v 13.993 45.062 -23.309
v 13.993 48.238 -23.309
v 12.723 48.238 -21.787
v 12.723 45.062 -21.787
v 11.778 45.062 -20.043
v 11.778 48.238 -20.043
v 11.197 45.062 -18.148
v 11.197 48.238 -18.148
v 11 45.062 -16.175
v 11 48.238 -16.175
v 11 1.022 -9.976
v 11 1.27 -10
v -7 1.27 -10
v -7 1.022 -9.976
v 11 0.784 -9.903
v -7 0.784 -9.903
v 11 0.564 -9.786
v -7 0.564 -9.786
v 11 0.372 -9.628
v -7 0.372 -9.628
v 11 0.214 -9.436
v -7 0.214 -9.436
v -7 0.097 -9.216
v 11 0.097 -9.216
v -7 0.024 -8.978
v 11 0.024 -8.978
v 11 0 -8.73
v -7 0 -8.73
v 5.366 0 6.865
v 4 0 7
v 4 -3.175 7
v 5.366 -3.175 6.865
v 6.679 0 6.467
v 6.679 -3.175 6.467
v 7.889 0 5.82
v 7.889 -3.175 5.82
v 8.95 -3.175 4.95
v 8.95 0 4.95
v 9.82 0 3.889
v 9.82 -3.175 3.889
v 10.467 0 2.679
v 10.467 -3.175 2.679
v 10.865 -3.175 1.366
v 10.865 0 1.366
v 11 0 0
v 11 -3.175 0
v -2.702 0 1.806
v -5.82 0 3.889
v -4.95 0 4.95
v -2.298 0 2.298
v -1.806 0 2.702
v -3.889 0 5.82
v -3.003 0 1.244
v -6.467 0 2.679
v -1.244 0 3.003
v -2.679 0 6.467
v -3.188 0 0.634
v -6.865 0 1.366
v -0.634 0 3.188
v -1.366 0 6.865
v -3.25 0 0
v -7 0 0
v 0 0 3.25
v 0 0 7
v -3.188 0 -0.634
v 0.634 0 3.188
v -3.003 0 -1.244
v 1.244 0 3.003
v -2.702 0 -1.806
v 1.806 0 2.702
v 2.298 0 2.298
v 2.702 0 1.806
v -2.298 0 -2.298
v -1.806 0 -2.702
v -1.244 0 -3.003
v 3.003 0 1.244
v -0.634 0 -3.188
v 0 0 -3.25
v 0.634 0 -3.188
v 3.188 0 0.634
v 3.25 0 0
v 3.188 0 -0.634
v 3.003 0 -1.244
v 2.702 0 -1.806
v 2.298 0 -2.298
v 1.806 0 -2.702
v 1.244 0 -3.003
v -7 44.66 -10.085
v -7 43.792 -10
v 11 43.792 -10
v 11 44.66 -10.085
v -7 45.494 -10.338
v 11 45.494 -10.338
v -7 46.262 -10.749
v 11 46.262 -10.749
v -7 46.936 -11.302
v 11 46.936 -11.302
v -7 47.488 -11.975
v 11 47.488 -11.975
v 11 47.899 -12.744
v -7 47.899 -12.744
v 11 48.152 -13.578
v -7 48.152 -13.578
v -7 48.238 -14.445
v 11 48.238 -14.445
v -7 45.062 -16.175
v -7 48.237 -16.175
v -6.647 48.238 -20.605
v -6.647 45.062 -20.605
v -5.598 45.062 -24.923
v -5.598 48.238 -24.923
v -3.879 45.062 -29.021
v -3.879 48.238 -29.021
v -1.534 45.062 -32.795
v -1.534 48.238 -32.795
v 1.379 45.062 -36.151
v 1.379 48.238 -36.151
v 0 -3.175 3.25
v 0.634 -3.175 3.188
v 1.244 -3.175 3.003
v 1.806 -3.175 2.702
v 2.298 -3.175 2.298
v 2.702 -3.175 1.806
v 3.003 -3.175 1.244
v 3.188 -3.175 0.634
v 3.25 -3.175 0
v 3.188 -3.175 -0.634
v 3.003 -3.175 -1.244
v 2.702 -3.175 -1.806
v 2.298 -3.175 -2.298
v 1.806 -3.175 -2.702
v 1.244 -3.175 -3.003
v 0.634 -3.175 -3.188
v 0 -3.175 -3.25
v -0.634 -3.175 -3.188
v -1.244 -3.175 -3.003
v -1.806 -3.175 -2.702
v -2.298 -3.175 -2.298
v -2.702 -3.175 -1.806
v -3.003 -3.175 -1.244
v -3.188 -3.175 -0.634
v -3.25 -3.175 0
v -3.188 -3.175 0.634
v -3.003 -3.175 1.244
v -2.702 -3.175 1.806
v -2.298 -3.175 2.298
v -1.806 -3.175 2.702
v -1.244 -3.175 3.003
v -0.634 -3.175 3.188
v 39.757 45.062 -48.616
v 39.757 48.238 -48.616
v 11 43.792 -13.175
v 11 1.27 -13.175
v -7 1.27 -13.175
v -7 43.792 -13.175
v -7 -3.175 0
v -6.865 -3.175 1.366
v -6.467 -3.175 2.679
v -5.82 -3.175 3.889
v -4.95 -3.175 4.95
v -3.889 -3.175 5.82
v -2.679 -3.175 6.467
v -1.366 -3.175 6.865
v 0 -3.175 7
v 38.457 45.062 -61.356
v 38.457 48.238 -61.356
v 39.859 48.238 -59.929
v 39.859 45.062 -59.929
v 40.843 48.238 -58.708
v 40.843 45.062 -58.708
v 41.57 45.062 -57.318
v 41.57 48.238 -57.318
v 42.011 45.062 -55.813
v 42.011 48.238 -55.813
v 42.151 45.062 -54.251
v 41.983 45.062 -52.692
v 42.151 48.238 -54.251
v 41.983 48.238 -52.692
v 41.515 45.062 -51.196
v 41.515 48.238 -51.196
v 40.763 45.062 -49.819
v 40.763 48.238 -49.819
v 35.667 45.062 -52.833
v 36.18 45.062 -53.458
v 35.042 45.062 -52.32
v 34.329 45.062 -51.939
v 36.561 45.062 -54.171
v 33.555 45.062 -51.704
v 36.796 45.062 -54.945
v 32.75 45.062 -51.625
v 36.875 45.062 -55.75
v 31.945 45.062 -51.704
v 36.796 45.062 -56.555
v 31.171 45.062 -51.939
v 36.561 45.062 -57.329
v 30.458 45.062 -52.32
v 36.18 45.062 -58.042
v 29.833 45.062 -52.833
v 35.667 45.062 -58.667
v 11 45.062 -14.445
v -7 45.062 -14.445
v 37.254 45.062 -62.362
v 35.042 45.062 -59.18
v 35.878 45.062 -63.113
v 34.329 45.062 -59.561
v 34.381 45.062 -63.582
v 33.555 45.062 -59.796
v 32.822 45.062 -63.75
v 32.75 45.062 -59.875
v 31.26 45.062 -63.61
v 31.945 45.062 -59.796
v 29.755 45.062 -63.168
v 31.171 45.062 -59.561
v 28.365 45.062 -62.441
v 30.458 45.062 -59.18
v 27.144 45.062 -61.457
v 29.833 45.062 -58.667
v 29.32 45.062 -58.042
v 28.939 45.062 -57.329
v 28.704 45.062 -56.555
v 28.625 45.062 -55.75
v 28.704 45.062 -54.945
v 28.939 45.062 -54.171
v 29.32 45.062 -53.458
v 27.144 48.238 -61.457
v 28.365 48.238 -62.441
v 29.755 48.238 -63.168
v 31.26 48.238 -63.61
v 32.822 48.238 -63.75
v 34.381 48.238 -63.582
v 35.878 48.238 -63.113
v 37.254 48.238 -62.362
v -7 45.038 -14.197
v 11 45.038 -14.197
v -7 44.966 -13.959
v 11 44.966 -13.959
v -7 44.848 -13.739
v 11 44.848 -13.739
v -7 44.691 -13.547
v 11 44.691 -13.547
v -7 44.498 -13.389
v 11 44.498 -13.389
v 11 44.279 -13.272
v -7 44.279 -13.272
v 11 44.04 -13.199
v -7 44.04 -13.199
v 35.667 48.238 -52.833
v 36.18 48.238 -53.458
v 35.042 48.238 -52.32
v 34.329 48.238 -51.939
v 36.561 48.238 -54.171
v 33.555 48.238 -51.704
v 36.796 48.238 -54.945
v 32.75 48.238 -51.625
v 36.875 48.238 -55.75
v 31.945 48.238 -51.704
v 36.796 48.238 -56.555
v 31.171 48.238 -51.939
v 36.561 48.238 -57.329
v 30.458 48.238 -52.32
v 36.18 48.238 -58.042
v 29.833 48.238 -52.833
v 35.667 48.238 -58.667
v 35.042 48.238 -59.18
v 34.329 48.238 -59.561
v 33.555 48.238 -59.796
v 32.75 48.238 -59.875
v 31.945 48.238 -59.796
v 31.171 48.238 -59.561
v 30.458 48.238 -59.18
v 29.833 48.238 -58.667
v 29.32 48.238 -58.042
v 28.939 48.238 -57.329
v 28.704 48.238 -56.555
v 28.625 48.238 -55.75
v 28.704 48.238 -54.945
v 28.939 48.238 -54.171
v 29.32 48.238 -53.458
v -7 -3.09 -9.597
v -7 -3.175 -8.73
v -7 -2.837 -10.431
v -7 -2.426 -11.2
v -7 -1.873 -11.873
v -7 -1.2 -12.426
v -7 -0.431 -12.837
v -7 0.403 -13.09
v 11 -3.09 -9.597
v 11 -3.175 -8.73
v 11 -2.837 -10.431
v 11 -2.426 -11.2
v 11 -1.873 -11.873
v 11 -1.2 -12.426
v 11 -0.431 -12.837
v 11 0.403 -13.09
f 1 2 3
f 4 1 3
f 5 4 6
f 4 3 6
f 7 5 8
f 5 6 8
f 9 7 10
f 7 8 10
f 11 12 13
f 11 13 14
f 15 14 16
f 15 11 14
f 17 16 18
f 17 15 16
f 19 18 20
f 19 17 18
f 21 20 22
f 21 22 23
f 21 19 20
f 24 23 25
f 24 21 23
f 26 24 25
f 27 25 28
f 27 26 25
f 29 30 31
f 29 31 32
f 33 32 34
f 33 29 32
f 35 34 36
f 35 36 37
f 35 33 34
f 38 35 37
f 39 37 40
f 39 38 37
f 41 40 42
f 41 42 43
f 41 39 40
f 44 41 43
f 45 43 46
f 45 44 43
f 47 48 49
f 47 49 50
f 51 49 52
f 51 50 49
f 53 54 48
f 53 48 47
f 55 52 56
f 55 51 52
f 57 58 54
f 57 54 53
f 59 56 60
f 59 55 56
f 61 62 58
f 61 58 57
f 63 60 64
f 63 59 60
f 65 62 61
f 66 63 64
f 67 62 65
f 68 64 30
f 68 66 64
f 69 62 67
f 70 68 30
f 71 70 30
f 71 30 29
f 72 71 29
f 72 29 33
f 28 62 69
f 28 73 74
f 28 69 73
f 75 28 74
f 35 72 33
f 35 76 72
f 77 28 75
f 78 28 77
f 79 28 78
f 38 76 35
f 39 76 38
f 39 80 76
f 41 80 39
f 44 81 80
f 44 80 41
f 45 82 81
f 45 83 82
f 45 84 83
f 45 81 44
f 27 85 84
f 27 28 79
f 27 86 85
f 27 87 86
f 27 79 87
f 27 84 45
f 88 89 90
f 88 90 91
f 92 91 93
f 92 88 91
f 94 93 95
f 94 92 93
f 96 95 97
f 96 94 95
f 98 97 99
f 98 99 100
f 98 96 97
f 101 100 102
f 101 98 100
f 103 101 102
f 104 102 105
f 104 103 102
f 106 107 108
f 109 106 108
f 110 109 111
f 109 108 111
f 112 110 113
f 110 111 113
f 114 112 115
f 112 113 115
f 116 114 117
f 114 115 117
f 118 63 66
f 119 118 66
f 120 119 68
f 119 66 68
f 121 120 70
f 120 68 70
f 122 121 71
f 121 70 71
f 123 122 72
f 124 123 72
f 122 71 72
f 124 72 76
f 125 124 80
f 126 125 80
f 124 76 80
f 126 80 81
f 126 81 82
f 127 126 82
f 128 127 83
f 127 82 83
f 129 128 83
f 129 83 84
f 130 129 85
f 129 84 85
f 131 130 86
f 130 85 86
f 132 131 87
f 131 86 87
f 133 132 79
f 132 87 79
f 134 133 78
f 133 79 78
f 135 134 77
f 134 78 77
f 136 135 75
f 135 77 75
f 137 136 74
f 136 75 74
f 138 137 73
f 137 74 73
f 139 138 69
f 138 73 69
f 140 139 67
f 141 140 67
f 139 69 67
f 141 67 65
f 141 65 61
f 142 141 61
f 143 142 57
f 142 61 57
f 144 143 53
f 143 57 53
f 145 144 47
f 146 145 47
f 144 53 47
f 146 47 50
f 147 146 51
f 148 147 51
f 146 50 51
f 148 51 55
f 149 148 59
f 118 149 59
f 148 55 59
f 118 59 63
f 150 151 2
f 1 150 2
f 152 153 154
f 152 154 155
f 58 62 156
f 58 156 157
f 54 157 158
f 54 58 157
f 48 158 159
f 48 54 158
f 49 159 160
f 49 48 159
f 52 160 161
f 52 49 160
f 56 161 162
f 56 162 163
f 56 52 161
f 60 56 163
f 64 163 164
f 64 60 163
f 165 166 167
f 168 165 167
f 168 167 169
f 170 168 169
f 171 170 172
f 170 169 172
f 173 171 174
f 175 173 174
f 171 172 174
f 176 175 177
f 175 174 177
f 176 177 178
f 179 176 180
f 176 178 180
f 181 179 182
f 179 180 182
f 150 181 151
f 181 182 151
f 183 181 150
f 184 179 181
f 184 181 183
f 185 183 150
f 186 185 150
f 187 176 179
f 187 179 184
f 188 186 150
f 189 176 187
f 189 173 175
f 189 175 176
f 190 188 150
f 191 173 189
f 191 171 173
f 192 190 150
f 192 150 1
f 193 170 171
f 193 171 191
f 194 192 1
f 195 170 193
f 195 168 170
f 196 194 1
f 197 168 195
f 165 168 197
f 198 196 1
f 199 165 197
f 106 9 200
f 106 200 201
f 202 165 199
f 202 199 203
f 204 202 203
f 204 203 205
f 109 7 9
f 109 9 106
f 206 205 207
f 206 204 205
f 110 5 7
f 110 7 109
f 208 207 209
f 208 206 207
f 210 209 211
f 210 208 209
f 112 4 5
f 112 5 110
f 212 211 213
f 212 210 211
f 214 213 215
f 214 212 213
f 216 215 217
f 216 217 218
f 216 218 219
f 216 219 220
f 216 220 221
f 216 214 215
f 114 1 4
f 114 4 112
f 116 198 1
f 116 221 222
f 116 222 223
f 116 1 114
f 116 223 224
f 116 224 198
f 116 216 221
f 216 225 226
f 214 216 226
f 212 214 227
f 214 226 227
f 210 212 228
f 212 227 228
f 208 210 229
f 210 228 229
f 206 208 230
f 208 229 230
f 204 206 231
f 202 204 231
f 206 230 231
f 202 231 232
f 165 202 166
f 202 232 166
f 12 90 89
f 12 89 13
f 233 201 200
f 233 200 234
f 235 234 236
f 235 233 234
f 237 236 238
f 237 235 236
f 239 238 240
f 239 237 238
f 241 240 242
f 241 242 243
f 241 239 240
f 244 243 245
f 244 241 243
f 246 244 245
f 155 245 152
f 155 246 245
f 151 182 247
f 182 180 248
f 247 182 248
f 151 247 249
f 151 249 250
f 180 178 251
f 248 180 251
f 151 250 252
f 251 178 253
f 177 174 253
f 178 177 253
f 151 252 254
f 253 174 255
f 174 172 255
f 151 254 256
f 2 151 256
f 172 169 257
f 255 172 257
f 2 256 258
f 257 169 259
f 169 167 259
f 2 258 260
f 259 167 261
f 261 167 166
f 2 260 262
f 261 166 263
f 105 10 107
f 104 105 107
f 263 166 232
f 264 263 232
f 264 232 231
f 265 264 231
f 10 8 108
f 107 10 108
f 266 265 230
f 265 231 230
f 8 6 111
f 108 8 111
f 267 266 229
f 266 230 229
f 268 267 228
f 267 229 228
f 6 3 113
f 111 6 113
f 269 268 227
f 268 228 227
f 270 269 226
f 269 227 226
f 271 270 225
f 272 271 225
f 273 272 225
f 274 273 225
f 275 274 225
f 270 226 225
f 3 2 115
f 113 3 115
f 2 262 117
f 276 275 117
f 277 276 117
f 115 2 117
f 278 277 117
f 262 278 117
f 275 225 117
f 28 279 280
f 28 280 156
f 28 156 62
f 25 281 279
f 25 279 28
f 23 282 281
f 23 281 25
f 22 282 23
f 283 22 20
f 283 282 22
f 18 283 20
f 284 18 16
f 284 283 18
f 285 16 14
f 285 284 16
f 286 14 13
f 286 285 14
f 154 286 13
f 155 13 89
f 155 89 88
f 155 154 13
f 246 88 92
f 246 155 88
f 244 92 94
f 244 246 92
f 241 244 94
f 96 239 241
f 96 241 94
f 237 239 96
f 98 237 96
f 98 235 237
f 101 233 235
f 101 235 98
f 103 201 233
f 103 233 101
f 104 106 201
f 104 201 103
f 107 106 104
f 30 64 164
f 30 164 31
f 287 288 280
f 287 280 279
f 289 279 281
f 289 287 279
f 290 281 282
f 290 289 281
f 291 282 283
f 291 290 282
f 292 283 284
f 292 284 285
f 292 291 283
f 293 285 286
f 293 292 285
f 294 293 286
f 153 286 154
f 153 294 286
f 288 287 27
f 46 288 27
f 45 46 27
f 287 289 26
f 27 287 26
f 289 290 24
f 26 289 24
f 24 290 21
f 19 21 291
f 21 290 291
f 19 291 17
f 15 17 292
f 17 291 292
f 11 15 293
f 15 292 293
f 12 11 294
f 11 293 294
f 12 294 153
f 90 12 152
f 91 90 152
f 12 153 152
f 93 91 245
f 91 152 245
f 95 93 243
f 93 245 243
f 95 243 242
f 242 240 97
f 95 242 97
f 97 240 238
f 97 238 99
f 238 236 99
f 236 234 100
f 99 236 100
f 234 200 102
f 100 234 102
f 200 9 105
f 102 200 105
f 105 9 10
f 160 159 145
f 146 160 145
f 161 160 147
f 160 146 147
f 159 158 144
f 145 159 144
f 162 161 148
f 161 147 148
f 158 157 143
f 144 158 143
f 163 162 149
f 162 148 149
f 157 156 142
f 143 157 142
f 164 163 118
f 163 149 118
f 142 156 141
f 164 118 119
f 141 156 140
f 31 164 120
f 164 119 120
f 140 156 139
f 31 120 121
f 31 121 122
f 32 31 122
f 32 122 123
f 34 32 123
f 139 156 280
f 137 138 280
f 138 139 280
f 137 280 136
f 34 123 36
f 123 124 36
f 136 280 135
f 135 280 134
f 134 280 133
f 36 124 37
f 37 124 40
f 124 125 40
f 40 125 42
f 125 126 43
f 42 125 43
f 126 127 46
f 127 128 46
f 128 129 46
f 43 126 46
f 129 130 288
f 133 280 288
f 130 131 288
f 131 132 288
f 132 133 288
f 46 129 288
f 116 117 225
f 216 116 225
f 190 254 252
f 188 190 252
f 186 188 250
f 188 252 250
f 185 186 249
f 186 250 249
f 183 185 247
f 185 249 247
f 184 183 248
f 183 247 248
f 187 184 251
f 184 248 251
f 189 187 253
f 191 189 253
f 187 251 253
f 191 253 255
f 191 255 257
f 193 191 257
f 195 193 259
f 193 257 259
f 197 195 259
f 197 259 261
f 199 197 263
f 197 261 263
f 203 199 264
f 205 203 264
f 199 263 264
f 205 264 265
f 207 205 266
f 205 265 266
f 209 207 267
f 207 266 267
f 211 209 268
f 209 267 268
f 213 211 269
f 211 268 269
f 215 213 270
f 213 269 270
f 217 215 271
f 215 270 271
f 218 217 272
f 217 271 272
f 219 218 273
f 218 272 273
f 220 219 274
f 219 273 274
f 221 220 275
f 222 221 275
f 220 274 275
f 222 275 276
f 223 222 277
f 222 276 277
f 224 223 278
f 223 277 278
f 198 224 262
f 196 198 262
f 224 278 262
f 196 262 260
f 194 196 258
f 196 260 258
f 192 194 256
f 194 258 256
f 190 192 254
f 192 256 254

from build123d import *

# Parameters (mm, degrees)
SKETCH1_R                    = 3.25
BASE_FLANGE1_DEPTH           = 3.175
EDGE_FLANGE1_STRIP_W         = 15.24
EDGE_FLANGE1_STRIP_H         = 3.175
EDGE_FLANGE1_STRIP_CUT_DEPTH = 18
EDGE_FLANGE1_DEPTH           = 18
EDGE_FLANGE2_STRIP_W         = 15.24
EDGE_FLANGE2_STRIP_H         = 3.175
EDGE_FLANGE2_STRIP_CUT_DEPTH = 18
EDGE_FLANGE2_DEPTH           = 18
SKETCH12_R                   = 4.125
BOSS_EXTRUDE1_DEPTH          = 3.175


# Sheet-metal steps are written as plain solids
with BuildPart() as part:
    # Sketch1 → Base-Flange1 (new body)
    with BuildSketch(Plane(origin=(0, 0, 0), x_dir=(1, 0, 0), z_dir=(0, 1, 0))):
        with BuildLine():
            Line((-7, 10), (-7, 0))
            ThreePointArc((-7, 0), (-4.949747468, -4.949747468), (0, -7))
            Line((0, -7), (4, -7))
            ThreePointArc((4, -7), (8.949747468, -4.949747468), (11, 0))
            Line((11, 0), (11, 10))
            Line((11, 10), (-7, 10))
        make_face()
        with Locations(Location((0, 0, 0), (0, 0, 270))):
            Circle(SKETCH1_R, mode=Mode.SUBTRACT)
    extrude(amount=-BASE_FLANGE1_DEPTH)

    # Edge-Flange1 strip (across the edge) → Edge-Flange1 strip cut (cut)
    with BuildSketch(Plane(origin=(11, 0, -10), x_dir=(0, 0, 1), z_dir=(-1, 0, 0))):
        with Locations((-6.35, -1.5875)):
            Rectangle(EDGE_FLANGE1_STRIP_W, EDGE_FLANGE1_STRIP_H)
    extrude(amount=EDGE_FLANGE1_STRIP_CUT_DEPTH, mode=Mode.SUBTRACT)

    # Edge-Flange1 section (across the edge) → Edge-Flange1 (add)
    with BuildSketch(Plane(origin=(11, 0, -10), x_dir=(0, 0, 1), z_dir=(-1, 0, 0))):
        with BuildLine():
            Line((-3.175, 1.27), (-3.175, 45.0625))
            Line((-3.175, 45.0625), (0, 45.0625))
            Line((0, 45.0625), (0, 1.27))
            ThreePointArc((0, 1.27), (0.371974388, 0.371974388), (1.27, 0))
            Line((1.27, 0), (1.27, -3.175))
            ThreePointArc((1.27, -3.175), (-1.873089642, -1.873089642), (-3.175, 1.27))
        make_face()
    extrude(amount=EDGE_FLANGE1_DEPTH)

    # Edge-Flange2 strip (across the edge) → Edge-Flange2 strip cut (cut)
    with BuildSketch(Plane(origin=(-7, 45.0625, -13.175), x_dir=(0, -1, 0), z_dir=(1, 0, 0))):
        with Locations((-6.35, -1.5875)):
            Rectangle(EDGE_FLANGE2_STRIP_W, EDGE_FLANGE2_STRIP_H)
    extrude(amount=EDGE_FLANGE2_STRIP_CUT_DEPTH, mode=Mode.SUBTRACT)

    # Edge-Flange2 section (across the edge) → Edge-Flange2 (add)
    with BuildSketch(Plane(origin=(-7, 45.0625, -13.175), x_dir=(0, -1, 0), z_dir=(1, 0, 0))):
        with BuildLine():
            Line((-3.175, 1.27), (-3.175, 3))
            Line((-3.175, 3), (0, 3))
            Line((0, 3), (0, 1.27))
            ThreePointArc((0, 1.27), (0.371974388, 0.371974388), (1.27, 0))
            Line((1.27, 0), (1.27, -3.175))
            ThreePointArc((1.27, -3.175), (-1.873089642, -1.873089642), (-3.175, 1.27))
        make_face()
    extrude(amount=EDGE_FLANGE2_DEPTH)

    # Sketch12 → Boss-Extrude1 (add)
    with BuildSketch(Plane(origin=(0, 48.2375, 0), x_dir=(1, 0, 0), z_dir=(0, 1, 0))):
        with BuildLine():
            Line((11, 16.175), (-7, 16.175))
            ThreePointArc((-7, 16.175), (-4.820309554, 27.006048634), (1.379401037, 36.150787753))
            Line((1.379401037, 36.150787753), (27.144104233, 61.457369654))
            ThreePointArc((27.144104233, 61.457369654), (32.821748623, 63.749679884), (38.457357581, 61.355887143))
            Line((38.457357581, 61.355887143), (39.858828935, 59.92904516))
            ThreePointArc((39.858828935, 59.92904516), (42.151139165, 54.251400771), (39.757346424, 48.615791813))
            Line((39.757346424, 48.615791813), (13.992643228, 23.309209912))
            ThreePointArc((13.992643228, 23.309209912), (11.778460873, 20.043231655), (11, 16.175))
        make_face()
        with Locations(Location((32.749989651, 55.750001725, 0), (0, 0, 270))):
            Circle(SKETCH12_R, mode=Mode.SUBTRACT)
    extrude(amount=-BOSS_EXTRUDE1_DEPTH)


solid = part.part
